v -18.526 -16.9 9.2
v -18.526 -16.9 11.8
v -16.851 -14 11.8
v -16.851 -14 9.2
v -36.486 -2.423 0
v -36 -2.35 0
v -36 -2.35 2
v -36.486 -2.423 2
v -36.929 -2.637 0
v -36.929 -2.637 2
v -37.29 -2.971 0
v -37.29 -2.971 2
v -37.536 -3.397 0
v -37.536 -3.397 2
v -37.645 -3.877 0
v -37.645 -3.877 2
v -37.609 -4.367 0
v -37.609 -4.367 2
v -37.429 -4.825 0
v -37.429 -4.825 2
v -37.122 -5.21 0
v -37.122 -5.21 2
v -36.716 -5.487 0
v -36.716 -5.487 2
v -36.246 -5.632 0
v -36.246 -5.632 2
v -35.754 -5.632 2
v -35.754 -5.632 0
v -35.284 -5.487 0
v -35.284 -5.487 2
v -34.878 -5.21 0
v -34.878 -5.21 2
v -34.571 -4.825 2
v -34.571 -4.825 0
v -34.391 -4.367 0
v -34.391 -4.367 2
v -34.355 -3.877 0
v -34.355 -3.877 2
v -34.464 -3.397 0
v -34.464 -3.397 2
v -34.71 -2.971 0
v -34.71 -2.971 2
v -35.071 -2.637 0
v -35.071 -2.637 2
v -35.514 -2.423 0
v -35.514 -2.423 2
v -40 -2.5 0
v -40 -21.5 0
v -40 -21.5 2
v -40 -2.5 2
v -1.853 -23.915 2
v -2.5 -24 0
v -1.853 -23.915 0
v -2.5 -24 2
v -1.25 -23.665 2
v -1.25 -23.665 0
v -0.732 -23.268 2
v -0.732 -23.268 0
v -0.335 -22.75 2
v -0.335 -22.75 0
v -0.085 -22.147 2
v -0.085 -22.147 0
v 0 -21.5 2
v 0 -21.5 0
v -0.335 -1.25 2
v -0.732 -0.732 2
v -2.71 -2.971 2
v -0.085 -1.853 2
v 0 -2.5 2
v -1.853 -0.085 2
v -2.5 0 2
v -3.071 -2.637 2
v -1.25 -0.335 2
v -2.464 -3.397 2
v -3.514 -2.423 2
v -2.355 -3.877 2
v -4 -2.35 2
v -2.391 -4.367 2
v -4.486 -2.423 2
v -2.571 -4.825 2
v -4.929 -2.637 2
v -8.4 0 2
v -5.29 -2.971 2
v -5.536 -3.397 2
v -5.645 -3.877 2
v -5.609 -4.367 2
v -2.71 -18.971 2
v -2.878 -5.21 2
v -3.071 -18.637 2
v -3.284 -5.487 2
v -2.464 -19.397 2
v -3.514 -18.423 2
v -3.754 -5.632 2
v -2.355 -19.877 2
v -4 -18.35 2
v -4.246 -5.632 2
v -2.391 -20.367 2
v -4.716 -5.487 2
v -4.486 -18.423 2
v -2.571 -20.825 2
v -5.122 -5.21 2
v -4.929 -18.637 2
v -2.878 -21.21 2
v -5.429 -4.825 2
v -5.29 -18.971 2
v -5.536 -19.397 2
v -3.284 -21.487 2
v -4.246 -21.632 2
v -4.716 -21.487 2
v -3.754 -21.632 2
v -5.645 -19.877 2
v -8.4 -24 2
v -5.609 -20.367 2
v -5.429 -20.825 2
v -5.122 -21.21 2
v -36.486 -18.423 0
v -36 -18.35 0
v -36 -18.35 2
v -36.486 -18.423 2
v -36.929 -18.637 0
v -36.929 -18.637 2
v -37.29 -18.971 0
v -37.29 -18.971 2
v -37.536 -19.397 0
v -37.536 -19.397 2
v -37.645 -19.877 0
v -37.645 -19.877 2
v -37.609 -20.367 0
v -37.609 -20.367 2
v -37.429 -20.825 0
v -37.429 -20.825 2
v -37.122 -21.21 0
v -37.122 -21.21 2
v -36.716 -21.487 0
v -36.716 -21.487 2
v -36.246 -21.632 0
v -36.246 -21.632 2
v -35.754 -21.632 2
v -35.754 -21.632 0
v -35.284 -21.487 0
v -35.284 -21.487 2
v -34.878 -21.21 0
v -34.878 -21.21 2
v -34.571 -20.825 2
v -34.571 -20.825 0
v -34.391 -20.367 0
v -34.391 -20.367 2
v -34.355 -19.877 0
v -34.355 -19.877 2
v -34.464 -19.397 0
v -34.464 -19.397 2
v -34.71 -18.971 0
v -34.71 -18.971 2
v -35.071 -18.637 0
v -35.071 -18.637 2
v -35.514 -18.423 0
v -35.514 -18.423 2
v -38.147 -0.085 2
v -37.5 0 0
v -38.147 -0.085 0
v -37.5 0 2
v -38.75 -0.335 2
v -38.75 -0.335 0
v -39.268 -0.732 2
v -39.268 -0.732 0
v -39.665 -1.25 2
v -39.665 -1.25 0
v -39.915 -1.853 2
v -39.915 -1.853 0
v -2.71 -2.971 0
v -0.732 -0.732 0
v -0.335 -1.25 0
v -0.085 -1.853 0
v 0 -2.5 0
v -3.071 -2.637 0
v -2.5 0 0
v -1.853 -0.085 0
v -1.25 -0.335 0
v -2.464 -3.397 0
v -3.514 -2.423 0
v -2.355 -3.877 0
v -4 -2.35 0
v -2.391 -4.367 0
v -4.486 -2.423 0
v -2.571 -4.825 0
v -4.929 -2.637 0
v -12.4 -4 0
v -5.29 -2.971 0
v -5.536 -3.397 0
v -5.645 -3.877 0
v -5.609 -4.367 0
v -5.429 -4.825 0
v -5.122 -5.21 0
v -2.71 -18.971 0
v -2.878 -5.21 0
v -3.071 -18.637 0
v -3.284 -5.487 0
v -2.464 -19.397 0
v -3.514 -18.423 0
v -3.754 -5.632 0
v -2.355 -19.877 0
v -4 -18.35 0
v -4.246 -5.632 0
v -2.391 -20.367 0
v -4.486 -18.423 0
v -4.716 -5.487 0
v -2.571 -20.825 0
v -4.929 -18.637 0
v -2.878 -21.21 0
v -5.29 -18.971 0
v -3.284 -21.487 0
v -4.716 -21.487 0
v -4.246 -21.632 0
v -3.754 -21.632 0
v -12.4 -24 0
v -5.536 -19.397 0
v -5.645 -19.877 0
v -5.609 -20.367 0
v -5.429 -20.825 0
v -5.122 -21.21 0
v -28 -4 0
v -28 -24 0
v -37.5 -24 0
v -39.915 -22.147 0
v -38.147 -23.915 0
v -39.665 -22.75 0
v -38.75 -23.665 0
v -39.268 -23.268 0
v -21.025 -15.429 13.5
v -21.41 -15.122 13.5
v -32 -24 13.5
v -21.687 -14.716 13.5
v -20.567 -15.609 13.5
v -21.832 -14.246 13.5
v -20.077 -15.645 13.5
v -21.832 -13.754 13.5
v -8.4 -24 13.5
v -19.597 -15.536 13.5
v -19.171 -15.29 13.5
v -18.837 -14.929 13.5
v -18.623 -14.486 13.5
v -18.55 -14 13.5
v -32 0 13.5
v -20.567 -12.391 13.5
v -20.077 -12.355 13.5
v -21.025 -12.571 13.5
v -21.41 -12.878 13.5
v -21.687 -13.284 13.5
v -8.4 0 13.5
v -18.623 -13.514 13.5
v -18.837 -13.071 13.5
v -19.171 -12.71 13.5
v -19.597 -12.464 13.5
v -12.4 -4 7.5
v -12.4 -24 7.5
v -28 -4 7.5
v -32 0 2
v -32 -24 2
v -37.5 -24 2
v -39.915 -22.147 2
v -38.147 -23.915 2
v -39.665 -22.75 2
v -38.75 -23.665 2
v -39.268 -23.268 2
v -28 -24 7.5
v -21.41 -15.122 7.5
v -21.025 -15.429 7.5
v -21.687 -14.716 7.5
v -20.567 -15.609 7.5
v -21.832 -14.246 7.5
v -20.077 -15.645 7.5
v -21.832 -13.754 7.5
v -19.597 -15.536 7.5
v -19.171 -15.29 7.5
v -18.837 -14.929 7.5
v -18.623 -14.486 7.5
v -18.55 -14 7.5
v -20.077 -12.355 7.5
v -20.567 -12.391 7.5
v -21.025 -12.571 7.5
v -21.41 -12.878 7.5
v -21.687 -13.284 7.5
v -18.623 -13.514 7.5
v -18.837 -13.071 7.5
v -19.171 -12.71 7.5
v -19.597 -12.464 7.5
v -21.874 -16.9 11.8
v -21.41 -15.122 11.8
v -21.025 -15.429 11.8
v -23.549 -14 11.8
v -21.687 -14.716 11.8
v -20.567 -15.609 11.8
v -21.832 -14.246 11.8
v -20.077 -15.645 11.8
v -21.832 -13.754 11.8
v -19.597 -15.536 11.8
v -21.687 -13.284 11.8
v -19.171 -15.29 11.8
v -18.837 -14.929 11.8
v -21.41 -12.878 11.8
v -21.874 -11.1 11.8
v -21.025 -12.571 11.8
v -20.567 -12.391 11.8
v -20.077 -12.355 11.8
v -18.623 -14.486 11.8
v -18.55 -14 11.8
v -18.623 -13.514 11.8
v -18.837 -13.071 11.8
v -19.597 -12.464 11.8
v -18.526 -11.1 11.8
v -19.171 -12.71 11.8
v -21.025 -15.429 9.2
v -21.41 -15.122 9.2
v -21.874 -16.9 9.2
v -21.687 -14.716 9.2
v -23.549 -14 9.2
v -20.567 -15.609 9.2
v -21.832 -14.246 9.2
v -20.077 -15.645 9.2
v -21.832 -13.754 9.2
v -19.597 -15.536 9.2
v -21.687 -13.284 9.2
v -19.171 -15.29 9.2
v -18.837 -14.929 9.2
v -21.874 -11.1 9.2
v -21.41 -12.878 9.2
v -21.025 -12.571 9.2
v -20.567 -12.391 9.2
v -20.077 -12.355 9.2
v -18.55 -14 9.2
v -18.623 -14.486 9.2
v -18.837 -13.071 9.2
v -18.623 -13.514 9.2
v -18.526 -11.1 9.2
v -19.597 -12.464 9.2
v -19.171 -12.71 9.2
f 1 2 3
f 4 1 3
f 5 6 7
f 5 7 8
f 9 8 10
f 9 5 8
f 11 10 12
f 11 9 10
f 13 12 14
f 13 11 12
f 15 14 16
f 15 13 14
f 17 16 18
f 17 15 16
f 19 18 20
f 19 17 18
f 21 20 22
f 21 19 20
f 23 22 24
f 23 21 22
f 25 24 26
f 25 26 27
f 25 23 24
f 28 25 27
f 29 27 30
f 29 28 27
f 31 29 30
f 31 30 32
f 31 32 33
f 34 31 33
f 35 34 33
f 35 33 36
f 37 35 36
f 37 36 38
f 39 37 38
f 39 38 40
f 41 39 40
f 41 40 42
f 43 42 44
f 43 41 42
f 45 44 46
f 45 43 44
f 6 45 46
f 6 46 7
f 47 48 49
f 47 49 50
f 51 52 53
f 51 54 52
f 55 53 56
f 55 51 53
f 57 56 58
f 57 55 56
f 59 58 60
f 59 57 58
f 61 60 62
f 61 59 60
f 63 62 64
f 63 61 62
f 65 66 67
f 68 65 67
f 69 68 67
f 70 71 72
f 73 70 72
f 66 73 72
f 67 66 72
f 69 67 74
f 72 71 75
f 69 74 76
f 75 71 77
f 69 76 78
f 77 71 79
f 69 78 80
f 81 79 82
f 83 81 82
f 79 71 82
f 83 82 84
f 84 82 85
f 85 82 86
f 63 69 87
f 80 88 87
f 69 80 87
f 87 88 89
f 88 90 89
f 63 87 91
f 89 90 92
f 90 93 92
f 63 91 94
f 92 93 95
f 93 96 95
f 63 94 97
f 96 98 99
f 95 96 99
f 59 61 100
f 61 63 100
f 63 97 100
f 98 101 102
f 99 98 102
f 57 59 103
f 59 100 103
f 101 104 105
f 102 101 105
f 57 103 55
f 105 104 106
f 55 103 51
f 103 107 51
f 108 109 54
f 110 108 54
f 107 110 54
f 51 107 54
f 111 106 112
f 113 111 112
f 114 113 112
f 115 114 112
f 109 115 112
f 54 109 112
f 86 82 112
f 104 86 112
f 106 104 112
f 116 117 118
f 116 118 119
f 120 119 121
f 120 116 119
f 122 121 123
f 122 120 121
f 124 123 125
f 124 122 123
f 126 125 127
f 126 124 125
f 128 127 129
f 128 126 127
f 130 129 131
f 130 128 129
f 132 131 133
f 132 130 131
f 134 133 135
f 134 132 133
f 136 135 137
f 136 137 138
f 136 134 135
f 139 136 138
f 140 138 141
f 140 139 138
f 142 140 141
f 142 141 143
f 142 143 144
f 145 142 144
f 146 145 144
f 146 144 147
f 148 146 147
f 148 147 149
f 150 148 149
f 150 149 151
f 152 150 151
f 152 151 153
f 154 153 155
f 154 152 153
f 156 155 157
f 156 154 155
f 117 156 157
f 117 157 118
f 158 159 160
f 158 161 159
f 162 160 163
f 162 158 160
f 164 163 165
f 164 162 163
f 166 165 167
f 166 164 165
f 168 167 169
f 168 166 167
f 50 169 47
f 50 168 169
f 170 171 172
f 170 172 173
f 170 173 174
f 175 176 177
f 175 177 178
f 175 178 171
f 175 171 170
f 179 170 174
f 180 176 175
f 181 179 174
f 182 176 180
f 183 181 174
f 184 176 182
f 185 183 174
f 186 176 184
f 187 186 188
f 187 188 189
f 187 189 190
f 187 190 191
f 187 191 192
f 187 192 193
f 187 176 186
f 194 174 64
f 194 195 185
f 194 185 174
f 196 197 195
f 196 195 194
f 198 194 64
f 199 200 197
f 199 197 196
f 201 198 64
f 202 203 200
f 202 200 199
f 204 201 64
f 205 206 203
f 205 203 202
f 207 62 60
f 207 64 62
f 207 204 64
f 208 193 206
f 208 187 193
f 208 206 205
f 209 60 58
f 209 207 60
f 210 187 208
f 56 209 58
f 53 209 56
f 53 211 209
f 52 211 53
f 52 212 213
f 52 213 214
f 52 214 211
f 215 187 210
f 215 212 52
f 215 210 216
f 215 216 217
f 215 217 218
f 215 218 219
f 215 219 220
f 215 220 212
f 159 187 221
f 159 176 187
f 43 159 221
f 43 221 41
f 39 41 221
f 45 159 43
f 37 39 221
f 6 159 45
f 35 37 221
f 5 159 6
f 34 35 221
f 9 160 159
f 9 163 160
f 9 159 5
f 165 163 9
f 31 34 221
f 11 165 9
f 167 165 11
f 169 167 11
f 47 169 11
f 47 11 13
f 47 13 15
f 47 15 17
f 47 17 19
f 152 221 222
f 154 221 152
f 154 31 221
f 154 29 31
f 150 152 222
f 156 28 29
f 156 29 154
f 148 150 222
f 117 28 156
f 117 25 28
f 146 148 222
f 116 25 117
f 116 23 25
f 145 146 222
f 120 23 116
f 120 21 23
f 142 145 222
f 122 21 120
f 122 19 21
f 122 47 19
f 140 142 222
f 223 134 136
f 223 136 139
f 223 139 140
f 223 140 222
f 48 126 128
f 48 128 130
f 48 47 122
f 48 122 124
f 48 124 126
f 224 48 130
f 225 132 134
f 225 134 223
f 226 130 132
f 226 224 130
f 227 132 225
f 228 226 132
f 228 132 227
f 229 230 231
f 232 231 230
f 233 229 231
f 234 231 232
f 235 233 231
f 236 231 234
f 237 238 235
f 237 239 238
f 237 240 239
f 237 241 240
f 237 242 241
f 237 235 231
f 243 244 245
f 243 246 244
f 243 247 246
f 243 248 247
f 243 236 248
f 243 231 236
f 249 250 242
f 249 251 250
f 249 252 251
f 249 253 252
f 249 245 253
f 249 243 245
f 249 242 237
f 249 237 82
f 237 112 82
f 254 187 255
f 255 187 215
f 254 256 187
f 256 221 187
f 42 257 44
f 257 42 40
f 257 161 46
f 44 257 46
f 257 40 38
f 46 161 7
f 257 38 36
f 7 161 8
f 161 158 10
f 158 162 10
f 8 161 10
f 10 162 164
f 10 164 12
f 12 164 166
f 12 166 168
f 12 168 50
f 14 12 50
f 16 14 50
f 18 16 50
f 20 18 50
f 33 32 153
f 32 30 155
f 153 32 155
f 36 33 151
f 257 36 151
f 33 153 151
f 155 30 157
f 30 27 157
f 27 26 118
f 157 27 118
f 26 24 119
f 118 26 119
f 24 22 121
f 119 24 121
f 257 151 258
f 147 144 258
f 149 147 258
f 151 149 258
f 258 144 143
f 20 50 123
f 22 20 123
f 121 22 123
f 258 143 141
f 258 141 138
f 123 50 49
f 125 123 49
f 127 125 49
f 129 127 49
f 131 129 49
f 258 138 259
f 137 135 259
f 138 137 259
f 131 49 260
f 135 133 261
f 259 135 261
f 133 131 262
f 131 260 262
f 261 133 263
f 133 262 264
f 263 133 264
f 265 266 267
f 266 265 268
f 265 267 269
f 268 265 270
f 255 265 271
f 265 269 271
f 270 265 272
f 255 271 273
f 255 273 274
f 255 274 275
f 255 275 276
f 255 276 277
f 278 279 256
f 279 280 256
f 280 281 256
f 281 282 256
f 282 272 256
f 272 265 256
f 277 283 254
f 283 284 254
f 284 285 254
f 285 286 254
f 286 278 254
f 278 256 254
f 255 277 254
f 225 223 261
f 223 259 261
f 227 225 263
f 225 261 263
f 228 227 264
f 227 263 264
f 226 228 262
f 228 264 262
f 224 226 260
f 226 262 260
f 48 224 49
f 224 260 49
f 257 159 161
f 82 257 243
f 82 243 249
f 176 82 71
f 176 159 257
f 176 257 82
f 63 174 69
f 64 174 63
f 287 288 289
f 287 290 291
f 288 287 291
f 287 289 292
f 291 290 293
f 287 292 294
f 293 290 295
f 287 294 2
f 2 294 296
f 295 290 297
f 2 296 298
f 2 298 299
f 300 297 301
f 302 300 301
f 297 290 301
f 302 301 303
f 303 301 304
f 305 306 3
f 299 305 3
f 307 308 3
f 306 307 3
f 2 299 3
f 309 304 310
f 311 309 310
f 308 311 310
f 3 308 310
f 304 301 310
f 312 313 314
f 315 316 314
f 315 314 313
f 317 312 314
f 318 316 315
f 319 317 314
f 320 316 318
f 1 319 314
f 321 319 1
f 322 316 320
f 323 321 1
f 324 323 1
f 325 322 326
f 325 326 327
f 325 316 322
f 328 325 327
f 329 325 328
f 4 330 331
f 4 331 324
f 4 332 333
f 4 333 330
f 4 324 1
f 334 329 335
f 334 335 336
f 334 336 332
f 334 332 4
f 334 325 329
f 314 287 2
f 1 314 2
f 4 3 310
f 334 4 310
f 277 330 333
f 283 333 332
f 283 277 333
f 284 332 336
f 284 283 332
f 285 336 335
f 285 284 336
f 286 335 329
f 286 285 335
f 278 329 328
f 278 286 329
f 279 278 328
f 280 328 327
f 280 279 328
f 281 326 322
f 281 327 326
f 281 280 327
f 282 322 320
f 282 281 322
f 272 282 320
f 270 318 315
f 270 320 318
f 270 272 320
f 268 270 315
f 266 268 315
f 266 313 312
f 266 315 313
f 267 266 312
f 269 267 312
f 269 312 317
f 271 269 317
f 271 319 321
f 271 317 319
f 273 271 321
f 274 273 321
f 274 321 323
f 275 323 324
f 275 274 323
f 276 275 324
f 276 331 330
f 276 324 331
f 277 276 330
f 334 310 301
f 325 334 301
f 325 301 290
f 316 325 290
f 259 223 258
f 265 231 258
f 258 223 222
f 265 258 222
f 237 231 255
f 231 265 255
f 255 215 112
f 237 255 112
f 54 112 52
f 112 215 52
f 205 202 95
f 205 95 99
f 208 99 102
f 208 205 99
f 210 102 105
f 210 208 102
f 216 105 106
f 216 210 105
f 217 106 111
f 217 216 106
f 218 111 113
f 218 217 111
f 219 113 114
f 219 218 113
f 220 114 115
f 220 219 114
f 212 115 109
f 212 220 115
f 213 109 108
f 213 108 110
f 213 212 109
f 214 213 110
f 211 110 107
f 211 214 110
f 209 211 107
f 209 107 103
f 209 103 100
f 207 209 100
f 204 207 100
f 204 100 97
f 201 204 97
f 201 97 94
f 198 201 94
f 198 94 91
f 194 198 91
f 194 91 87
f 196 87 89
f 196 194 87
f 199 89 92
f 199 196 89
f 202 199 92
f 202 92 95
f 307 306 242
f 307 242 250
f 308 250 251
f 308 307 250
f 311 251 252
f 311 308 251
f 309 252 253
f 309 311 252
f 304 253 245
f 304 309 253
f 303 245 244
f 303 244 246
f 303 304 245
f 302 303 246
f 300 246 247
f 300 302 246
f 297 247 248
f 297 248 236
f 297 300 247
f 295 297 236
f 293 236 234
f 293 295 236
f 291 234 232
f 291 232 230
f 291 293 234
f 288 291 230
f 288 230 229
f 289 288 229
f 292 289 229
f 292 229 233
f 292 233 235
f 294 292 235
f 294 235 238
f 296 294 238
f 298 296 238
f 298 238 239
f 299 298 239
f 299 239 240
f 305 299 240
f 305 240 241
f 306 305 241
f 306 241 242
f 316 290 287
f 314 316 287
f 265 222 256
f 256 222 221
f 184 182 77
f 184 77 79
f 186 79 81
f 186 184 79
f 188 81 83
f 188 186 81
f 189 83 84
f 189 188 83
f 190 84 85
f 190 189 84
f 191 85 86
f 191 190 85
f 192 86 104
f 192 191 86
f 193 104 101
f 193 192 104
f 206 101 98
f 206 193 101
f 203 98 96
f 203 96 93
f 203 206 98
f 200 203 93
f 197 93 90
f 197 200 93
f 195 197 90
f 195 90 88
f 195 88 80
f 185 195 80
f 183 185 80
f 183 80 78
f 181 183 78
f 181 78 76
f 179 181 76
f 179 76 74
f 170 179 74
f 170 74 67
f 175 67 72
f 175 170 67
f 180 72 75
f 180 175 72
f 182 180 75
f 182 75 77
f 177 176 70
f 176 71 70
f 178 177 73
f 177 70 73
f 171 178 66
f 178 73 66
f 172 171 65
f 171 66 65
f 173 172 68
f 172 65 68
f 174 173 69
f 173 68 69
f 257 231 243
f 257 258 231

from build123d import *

# Parameters (mm, degrees)
SKETCH1_R           = 1.65
BOSS_EXTRUDE1_DEPTH = 2
BOSS_EXTRUDE2_DEPTH = 5.5
SKETCH3_W           = 23.6
SKETCH3_H           = 24
SKETCH3_R           = 1.65
BOSS_EXTRUDE3_DEPTH = 6
CUT_EXTRUDE1_START  = -1.7
CUT_EXTRUDE1_DEPTH  = 2.6
FILLET1_R           = 2.5


with BuildPart() as part:
    # Sketch1 → Boss-Extrude1 (new body)
    with BuildSketch(Plane(origin=(0, 0, 0), x_dir=(0, 1, 0), z_dir=(0, 0, 1))):
        Polygon((-24, 12.4), (-4, 12.4), (-4, 28), (-24, 28), (-24, 40), (0, 40), (0, 0), (-24, 0), align=None)
        with Locations((-20, 4)):
            Circle(SKETCH1_R, mode=Mode.SUBTRACT)
        with Locations((-4, 4)):
            Circle(SKETCH1_R, mode=Mode.SUBTRACT)
        with Locations((-4, 36)):
            Circle(SKETCH1_R, mode=Mode.SUBTRACT)
        with Locations((-20, 36)):
            Circle(SKETCH1_R, mode=Mode.SUBTRACT)
    extrude(amount=BOSS_EXTRUDE1_DEPTH)

    # Sketch2 → Boss-Extrude2 (add)
    with BuildSketch(Plane.XY.offset(2)):
        Polygon((-28, -24), (-28, -4), (-12.4, -4), (-12.4, -24), (-8.4, -24), (-8.4, 0), (-32, 0), (-32, -24), align=None)
    extrude(amount=BOSS_EXTRUDE2_DEPTH)

    # Sketch3 → Boss-Extrude3 (add)
    with BuildSketch(Plane.XY.offset(7.5)):
        with Locations((-20.2, -12)):
            Rectangle(SKETCH3_W, SKETCH3_H)
        with Locations((-20.2, -14)):
            Circle(SKETCH3_R, mode=Mode.SUBTRACT)
    extrude(amount=BOSS_EXTRUDE3_DEPTH)

    # Sketch4 → Cut-Extrude1 (cut)
    with BuildSketch(Plane.XY.offset(13.5).offset(CUT_EXTRUDE1_START)):
        Polygon((-16.851368439, -14), (-18.525684219, -11.1), (-21.874315781, -11.1), (-23.548631561, -14), (-21.874315781, -16.9), (-18.525684219, -16.9), align=None)
    extrude(amount=-CUT_EXTRUDE1_DEPTH, mode=Mode.SUBTRACT)

    # Fillet1
    fillet1_edges = [part.edges().sort_by_distance(p)[0] for p in [
        (0, 0, 1),
        (0, -24, 1),
        (-40, -24, 1),
        (-40, 0, 1),
    ]]
    fillet(fillet1_edges, radius=FILLET1_R)


solid = part.part
